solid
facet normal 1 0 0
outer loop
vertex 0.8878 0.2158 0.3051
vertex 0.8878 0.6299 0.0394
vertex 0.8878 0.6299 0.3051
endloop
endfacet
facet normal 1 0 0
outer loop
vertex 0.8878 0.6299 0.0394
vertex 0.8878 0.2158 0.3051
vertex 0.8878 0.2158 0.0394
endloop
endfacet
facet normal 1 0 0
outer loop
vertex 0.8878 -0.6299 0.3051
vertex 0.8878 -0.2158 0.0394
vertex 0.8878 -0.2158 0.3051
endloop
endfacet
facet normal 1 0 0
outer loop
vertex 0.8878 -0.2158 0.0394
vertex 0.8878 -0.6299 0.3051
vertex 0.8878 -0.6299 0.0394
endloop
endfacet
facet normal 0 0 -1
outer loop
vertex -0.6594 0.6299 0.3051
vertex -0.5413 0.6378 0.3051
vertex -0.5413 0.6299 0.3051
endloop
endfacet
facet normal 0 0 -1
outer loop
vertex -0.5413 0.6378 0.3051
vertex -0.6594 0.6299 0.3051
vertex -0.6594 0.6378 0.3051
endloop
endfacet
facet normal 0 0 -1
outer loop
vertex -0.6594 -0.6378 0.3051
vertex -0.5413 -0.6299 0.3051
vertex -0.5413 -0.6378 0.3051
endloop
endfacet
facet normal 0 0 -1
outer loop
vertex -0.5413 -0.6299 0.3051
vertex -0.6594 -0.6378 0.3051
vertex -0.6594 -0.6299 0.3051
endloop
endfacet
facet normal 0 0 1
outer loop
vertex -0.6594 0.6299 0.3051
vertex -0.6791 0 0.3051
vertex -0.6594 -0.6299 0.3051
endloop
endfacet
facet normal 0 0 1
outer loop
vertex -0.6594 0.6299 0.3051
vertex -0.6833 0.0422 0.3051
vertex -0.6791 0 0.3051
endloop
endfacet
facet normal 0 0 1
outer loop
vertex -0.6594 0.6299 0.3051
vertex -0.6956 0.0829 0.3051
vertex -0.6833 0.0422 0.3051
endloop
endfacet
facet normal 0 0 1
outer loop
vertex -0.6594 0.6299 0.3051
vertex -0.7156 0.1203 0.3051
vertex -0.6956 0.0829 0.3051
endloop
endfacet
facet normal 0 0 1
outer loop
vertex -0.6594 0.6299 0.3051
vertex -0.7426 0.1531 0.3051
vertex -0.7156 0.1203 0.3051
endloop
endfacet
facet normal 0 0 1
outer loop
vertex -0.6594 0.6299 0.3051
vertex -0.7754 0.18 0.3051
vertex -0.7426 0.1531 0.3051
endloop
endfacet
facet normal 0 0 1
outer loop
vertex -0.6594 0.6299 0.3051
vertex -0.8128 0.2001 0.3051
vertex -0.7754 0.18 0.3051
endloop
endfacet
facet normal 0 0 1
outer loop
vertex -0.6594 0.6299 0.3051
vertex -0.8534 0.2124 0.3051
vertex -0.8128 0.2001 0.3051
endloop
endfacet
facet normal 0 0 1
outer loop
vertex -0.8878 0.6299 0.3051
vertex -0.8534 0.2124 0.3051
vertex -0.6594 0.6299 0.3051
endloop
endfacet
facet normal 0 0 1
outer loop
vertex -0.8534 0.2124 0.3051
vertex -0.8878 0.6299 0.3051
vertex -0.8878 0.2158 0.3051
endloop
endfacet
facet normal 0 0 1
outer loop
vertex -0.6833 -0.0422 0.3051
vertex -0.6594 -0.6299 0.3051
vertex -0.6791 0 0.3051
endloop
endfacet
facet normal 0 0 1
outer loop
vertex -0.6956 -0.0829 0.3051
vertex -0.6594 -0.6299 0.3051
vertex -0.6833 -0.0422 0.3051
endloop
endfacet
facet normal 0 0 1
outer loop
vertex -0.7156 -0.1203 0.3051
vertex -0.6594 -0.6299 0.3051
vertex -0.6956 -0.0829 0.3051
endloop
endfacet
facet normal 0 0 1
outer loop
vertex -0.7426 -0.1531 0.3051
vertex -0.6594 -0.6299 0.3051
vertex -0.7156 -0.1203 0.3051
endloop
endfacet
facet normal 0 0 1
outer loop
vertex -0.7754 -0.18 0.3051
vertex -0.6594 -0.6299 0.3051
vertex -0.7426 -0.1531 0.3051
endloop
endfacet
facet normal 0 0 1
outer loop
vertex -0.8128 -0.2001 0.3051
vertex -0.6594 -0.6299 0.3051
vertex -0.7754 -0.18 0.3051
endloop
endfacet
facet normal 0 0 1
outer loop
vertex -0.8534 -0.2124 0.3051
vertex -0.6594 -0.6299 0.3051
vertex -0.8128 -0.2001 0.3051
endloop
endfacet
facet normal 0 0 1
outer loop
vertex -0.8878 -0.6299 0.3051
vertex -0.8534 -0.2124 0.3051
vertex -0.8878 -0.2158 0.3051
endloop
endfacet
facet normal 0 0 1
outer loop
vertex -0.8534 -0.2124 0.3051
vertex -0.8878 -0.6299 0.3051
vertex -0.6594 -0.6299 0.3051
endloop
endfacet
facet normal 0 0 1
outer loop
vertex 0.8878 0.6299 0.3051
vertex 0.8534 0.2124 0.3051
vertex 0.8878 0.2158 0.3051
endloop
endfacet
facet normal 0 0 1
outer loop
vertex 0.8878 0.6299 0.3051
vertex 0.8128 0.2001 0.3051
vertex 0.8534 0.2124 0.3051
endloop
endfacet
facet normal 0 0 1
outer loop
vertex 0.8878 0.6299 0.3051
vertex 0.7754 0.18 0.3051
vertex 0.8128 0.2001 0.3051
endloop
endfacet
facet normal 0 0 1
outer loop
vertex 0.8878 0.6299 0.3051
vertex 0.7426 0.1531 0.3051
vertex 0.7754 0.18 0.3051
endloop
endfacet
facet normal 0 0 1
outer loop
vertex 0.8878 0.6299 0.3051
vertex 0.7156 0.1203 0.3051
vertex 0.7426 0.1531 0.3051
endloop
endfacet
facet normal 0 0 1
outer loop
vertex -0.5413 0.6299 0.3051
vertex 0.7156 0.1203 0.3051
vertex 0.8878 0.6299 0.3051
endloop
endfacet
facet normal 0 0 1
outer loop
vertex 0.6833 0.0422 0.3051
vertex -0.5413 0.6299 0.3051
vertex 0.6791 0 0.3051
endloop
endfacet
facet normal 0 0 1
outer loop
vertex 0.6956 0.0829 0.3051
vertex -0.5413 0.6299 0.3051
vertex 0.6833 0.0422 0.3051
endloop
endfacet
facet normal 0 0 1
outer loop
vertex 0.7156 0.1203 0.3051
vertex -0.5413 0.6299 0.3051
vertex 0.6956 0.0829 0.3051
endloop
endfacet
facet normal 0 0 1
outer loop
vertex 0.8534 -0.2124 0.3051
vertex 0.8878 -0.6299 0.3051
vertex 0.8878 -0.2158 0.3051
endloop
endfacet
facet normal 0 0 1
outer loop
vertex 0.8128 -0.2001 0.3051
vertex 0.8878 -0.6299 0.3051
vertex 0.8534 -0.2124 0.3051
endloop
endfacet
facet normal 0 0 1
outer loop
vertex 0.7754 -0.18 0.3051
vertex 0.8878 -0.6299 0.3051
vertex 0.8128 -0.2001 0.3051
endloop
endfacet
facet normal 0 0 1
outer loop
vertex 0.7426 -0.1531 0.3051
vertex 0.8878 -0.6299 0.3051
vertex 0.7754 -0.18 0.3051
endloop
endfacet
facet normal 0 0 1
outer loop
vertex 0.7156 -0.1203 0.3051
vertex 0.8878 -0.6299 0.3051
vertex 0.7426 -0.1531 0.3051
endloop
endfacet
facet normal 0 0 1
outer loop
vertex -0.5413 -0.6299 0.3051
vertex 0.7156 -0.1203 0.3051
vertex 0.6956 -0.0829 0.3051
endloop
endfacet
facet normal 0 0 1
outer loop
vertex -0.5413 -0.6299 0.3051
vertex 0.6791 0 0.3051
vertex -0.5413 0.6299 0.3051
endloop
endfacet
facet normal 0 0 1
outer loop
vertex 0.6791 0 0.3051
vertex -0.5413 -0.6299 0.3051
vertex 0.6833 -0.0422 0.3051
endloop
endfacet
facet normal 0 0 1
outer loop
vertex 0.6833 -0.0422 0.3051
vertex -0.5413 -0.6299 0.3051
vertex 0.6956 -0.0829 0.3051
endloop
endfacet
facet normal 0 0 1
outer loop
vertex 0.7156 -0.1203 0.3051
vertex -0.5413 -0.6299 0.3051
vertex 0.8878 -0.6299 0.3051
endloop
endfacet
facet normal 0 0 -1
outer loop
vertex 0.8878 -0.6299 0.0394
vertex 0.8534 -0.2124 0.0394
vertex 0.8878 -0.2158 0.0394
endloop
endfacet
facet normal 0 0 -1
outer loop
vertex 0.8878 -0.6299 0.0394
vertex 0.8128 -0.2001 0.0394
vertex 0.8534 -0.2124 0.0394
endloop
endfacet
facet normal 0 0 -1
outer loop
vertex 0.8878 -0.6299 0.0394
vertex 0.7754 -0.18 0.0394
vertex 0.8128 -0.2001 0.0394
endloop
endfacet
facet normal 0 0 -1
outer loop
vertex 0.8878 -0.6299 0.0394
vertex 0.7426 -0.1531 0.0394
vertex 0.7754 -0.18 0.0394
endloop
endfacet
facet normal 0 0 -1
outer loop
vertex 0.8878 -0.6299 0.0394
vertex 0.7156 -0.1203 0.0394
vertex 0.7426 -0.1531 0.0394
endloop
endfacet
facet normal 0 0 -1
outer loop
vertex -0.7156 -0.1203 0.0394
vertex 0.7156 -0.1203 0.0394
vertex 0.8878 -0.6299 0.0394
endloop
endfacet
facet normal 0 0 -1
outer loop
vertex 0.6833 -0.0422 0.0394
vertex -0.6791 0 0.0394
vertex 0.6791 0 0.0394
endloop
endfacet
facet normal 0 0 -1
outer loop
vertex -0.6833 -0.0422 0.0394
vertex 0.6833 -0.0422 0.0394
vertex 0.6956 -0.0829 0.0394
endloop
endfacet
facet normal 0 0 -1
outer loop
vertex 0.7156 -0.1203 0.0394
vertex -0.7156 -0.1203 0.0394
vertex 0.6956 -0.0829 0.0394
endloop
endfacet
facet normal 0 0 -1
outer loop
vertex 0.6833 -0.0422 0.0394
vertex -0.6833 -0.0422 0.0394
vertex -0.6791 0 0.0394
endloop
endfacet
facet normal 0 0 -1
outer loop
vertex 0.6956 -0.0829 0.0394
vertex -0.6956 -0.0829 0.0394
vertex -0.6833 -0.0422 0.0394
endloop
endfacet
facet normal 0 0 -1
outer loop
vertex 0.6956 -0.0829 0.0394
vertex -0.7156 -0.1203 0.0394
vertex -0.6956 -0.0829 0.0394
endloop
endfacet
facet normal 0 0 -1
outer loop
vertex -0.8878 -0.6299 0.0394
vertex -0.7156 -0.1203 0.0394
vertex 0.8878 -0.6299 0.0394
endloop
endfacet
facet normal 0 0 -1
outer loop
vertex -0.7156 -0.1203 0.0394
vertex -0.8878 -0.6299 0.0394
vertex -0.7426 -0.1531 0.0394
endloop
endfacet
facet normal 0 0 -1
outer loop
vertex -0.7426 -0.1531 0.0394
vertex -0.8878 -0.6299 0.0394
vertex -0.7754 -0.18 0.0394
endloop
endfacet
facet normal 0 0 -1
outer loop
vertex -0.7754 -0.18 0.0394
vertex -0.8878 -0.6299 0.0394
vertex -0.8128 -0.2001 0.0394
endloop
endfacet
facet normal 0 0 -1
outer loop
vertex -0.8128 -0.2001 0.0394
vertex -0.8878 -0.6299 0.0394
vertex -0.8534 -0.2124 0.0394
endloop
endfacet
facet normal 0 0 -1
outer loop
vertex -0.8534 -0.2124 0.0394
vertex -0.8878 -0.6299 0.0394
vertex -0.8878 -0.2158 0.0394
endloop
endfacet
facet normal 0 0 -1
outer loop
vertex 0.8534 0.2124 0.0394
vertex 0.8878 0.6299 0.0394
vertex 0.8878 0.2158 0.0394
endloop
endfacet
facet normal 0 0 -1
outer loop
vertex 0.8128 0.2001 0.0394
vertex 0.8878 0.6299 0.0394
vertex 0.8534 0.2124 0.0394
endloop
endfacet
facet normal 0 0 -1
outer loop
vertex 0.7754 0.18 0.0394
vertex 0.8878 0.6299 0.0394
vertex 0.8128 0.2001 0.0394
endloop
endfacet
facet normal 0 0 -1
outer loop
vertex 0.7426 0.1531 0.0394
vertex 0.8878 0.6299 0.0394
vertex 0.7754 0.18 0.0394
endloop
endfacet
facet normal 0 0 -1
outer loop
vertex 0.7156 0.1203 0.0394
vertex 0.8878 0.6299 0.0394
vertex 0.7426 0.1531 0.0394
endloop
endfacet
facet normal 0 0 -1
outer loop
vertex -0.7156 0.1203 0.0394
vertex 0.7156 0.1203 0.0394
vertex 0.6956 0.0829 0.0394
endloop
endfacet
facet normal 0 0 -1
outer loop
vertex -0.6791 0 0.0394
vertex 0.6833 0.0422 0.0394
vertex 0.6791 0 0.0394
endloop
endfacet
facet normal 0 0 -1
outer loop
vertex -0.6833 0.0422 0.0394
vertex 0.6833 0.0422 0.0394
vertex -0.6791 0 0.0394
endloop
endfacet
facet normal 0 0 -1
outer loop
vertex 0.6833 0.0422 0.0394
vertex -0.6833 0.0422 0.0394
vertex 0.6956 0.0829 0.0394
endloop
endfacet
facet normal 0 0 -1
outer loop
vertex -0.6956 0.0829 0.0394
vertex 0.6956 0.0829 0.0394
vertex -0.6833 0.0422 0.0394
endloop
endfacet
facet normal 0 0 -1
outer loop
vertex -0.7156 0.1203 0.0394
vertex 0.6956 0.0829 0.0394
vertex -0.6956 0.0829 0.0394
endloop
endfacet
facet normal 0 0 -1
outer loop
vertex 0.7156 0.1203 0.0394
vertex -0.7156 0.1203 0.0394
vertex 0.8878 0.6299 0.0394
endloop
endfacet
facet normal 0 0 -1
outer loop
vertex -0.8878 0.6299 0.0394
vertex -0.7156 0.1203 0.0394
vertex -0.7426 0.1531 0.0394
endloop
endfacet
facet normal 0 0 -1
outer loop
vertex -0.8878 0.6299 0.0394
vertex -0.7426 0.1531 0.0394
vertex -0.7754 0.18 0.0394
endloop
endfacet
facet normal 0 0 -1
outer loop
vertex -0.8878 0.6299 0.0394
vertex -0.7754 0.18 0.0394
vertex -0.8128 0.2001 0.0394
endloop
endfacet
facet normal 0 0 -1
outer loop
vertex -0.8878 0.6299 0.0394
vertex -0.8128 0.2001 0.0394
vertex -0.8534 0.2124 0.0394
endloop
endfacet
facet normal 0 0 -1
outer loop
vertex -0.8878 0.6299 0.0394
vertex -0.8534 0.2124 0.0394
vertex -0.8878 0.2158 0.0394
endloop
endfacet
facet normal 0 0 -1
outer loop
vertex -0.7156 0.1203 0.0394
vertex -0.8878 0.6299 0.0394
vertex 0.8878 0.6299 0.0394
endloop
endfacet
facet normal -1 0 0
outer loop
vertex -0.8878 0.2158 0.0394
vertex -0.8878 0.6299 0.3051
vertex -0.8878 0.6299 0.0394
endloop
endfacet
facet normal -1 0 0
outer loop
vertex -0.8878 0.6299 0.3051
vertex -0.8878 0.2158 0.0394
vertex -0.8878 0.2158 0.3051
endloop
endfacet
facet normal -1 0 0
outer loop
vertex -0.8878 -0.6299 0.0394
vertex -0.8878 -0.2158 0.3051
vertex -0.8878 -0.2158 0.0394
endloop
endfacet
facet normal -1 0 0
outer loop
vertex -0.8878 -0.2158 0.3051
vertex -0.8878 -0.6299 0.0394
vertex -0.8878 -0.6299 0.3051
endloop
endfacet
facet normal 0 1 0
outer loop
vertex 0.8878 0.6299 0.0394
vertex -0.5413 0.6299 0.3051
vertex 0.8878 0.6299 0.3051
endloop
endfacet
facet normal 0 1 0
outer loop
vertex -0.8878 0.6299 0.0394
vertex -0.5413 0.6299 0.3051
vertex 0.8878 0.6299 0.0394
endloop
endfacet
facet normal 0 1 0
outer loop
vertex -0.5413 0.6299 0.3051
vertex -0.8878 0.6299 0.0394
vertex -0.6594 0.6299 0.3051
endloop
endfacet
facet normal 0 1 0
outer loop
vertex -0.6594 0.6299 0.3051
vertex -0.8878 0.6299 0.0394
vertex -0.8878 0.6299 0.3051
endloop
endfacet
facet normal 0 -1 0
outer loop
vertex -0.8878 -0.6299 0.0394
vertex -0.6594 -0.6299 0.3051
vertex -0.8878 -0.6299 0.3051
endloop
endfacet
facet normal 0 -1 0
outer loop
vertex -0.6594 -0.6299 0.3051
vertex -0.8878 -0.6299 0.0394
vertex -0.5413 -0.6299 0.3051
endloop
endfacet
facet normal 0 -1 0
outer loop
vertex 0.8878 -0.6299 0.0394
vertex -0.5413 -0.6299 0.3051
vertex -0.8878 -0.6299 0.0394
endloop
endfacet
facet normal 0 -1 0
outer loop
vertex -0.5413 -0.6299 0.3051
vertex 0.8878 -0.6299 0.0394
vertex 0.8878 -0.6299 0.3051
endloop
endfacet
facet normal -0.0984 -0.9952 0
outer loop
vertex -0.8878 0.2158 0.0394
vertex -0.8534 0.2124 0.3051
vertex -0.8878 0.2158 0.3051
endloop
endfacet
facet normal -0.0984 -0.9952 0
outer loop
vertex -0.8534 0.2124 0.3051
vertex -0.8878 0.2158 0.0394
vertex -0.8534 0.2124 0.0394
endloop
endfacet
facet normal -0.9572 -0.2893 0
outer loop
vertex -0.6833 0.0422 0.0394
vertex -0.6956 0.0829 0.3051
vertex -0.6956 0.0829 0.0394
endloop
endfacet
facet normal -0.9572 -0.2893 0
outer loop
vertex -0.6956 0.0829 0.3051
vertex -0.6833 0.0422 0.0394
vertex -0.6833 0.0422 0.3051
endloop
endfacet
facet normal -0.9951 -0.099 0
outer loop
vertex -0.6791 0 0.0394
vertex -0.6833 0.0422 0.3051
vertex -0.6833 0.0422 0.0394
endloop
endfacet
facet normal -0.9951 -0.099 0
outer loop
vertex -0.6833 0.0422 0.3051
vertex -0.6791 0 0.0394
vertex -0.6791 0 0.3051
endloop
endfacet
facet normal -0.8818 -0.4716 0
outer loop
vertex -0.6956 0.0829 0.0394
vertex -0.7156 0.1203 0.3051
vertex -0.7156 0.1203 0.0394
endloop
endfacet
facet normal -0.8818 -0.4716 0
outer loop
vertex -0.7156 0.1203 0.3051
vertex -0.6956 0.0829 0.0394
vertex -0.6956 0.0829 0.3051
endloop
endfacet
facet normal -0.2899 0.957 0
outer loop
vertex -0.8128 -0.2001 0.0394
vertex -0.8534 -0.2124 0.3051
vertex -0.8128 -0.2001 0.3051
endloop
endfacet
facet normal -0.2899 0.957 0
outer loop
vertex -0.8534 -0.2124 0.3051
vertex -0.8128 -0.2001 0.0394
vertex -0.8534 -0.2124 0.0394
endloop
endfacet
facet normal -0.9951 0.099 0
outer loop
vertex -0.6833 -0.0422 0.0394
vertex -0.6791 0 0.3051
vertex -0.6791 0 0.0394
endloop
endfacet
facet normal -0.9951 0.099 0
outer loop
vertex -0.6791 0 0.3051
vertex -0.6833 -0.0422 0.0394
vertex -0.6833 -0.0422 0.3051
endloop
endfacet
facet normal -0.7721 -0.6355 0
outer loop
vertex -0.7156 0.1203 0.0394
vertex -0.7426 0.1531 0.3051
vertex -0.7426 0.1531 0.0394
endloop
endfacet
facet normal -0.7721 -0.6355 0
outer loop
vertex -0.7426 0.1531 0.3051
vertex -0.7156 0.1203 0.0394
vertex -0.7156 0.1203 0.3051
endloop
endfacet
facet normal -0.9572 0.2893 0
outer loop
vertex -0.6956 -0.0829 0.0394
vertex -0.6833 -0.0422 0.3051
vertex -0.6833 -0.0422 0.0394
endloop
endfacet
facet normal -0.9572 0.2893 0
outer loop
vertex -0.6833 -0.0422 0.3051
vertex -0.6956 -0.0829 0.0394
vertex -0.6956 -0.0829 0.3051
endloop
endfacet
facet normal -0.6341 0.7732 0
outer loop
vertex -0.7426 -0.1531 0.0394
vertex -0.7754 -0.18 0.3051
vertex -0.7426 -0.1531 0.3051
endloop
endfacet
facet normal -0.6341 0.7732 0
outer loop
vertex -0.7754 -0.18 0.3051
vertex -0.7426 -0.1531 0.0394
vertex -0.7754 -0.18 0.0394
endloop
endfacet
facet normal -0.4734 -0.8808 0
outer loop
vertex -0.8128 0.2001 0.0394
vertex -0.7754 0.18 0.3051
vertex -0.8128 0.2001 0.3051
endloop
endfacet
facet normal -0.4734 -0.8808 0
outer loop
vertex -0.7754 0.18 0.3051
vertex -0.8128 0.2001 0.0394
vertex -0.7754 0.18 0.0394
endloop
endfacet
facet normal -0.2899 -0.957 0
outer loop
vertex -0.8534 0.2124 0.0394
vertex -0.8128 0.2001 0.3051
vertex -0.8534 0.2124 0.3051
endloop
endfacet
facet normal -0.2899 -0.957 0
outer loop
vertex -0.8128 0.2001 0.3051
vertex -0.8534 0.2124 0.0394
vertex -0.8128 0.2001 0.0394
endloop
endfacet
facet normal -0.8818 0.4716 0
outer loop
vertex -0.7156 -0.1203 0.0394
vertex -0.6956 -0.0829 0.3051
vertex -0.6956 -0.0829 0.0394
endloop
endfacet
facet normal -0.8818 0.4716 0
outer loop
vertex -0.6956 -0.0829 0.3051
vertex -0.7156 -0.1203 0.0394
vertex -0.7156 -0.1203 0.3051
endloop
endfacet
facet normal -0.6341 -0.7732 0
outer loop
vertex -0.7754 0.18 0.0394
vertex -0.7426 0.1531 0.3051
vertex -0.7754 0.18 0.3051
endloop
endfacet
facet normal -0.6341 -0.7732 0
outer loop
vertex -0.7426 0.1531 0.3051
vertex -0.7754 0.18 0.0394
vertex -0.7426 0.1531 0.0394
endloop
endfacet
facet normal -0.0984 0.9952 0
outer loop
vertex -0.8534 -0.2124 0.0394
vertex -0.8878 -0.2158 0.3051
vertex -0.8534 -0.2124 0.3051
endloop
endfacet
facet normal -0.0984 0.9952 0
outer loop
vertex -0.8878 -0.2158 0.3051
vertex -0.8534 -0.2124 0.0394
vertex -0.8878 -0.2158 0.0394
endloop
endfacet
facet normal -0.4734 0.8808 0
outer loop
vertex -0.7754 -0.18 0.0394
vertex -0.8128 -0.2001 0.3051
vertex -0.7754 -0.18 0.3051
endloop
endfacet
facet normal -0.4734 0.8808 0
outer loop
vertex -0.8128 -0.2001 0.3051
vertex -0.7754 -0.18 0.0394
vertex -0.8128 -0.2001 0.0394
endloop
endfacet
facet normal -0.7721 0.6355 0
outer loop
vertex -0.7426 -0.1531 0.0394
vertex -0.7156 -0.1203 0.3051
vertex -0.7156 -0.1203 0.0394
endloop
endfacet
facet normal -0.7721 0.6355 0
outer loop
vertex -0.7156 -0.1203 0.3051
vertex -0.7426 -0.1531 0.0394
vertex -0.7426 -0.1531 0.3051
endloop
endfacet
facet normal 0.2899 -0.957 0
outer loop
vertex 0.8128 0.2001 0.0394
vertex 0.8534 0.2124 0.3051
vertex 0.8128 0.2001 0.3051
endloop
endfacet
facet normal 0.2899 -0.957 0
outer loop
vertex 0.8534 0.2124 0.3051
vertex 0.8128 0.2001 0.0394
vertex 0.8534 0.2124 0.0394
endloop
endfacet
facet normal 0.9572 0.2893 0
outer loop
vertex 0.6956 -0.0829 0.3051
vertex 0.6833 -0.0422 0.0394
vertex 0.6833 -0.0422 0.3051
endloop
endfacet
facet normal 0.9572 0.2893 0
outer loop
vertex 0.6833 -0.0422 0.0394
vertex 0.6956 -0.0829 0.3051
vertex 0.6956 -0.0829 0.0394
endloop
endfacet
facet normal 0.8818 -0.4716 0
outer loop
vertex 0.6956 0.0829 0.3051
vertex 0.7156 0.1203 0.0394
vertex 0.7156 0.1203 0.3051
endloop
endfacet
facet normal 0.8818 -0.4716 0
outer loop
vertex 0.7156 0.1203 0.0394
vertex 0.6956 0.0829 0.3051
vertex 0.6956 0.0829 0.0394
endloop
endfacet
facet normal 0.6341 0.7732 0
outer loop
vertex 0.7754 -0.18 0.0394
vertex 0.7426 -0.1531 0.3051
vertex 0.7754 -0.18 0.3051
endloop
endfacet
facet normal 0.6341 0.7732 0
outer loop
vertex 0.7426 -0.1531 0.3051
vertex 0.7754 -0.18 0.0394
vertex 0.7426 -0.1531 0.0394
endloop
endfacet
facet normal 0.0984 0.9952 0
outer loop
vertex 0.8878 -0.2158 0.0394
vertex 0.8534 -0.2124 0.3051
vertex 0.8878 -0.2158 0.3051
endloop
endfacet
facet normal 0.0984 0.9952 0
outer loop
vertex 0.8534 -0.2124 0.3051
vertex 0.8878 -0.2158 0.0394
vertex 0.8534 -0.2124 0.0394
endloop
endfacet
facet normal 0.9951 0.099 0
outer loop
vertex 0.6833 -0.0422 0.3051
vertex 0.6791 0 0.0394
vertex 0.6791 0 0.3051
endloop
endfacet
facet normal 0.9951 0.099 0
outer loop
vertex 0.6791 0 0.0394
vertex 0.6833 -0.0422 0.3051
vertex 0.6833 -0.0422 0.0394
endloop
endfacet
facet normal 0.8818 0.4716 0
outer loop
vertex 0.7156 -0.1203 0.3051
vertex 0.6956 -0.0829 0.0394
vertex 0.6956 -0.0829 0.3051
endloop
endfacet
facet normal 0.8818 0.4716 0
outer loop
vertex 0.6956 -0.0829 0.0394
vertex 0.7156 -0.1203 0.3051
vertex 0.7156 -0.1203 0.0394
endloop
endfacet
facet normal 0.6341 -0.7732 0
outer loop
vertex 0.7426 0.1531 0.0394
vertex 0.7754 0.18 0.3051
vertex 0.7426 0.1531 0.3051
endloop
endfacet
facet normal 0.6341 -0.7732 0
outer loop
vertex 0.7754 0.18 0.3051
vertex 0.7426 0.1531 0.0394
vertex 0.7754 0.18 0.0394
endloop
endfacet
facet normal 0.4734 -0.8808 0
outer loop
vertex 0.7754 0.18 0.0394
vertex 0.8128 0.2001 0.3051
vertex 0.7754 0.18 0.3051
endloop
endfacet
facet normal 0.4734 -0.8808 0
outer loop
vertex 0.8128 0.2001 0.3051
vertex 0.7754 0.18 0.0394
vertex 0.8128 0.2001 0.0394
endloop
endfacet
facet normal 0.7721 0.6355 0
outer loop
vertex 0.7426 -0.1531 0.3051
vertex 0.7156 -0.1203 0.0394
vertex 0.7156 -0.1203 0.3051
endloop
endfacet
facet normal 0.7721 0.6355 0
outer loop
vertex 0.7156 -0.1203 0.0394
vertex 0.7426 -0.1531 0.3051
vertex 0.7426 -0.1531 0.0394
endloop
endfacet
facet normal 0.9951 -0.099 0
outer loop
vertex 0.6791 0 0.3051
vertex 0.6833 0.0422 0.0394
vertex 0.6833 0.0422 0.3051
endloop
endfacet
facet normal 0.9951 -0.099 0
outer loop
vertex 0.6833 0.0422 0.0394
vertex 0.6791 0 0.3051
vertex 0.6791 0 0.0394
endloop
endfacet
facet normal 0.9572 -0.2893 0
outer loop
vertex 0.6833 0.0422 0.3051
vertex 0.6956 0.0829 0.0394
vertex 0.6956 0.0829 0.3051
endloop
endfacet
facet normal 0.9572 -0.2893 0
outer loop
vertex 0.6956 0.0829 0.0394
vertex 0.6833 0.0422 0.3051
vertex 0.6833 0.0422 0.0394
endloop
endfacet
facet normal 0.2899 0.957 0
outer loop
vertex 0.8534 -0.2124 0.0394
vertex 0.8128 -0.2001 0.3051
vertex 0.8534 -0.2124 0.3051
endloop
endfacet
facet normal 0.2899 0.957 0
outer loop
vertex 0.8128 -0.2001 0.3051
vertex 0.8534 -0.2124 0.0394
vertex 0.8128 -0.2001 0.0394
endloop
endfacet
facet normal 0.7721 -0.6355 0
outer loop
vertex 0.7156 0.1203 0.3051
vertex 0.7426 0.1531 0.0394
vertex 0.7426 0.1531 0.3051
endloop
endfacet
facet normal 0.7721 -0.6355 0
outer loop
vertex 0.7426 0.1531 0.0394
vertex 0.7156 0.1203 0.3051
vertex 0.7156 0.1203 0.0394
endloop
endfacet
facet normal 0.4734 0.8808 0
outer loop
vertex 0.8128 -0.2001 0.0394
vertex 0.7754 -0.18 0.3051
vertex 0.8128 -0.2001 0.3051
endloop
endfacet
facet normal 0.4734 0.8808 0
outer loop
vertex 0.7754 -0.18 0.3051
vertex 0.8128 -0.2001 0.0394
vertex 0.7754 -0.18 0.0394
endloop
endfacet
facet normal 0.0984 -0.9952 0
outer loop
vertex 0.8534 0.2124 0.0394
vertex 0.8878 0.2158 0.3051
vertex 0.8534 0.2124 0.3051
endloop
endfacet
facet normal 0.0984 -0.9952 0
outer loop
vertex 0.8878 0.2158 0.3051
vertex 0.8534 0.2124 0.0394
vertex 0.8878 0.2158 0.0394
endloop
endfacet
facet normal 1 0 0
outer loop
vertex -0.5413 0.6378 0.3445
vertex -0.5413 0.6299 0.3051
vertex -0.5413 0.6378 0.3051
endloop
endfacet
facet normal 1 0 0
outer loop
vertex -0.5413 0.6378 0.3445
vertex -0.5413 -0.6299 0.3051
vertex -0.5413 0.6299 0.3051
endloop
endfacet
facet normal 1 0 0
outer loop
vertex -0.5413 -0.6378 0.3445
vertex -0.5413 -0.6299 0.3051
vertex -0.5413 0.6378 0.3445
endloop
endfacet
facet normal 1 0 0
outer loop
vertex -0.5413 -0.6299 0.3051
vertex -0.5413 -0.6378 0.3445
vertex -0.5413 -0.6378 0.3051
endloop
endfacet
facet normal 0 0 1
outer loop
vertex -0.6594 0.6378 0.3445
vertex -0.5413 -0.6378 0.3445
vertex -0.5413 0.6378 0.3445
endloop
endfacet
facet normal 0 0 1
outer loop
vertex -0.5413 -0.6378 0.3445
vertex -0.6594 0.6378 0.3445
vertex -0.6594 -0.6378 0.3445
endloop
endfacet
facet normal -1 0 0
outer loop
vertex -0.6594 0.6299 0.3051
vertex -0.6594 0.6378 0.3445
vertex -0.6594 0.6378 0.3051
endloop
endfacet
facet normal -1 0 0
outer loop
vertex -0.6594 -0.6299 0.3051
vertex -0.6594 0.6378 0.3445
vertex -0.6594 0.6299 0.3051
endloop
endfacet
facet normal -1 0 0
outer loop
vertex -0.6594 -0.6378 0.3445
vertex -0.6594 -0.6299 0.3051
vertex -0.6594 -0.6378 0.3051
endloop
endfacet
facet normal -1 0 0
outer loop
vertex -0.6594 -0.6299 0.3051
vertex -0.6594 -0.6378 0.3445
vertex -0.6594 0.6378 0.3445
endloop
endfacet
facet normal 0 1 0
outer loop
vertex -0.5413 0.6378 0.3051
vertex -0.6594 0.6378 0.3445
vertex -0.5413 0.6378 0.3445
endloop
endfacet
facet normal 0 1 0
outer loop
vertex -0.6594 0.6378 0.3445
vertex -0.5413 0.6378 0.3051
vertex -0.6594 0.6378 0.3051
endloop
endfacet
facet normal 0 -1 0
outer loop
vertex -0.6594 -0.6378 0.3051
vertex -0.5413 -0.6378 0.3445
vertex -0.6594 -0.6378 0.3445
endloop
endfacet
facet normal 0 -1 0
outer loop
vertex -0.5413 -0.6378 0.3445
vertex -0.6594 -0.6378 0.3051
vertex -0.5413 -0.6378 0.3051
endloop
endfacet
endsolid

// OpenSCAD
// file: defines.scad
A = 4.55;   // 4.37...4.73
B = 3.24;   // 3.07...3.41
C = 0.875;  // 0.55...1.20
D = 0.6;    // 0.25...0.95
E = 0.45;   // 0.25...0.65

pt = 0.1; // Толщина элеметов (дорожек, краски и т.п)
lab_mark = 0.3; // Полоска

$fn = 32;

scale = 1/2.54;
// main file
include <defines.scad>

plw = 0.02;

scale(scale)
  color([0.15,0.15,0.15])
    union(){
      translate([-A/2+D, -B/2, C-pt]) cube([lab_mark, B, pt]);
      difference() {
        translate([-A/2+plw, -B/2+plw, pt]) cube([A-2*plw, B-2*plw, C-pt-pt]);
        translate([-A/2, 0, -1]) cylinder(r = E+pt, h = C+2);
        translate([ A/2, 0, -1]) cylinder(r = E+pt, h = C+2);
      }
    }
